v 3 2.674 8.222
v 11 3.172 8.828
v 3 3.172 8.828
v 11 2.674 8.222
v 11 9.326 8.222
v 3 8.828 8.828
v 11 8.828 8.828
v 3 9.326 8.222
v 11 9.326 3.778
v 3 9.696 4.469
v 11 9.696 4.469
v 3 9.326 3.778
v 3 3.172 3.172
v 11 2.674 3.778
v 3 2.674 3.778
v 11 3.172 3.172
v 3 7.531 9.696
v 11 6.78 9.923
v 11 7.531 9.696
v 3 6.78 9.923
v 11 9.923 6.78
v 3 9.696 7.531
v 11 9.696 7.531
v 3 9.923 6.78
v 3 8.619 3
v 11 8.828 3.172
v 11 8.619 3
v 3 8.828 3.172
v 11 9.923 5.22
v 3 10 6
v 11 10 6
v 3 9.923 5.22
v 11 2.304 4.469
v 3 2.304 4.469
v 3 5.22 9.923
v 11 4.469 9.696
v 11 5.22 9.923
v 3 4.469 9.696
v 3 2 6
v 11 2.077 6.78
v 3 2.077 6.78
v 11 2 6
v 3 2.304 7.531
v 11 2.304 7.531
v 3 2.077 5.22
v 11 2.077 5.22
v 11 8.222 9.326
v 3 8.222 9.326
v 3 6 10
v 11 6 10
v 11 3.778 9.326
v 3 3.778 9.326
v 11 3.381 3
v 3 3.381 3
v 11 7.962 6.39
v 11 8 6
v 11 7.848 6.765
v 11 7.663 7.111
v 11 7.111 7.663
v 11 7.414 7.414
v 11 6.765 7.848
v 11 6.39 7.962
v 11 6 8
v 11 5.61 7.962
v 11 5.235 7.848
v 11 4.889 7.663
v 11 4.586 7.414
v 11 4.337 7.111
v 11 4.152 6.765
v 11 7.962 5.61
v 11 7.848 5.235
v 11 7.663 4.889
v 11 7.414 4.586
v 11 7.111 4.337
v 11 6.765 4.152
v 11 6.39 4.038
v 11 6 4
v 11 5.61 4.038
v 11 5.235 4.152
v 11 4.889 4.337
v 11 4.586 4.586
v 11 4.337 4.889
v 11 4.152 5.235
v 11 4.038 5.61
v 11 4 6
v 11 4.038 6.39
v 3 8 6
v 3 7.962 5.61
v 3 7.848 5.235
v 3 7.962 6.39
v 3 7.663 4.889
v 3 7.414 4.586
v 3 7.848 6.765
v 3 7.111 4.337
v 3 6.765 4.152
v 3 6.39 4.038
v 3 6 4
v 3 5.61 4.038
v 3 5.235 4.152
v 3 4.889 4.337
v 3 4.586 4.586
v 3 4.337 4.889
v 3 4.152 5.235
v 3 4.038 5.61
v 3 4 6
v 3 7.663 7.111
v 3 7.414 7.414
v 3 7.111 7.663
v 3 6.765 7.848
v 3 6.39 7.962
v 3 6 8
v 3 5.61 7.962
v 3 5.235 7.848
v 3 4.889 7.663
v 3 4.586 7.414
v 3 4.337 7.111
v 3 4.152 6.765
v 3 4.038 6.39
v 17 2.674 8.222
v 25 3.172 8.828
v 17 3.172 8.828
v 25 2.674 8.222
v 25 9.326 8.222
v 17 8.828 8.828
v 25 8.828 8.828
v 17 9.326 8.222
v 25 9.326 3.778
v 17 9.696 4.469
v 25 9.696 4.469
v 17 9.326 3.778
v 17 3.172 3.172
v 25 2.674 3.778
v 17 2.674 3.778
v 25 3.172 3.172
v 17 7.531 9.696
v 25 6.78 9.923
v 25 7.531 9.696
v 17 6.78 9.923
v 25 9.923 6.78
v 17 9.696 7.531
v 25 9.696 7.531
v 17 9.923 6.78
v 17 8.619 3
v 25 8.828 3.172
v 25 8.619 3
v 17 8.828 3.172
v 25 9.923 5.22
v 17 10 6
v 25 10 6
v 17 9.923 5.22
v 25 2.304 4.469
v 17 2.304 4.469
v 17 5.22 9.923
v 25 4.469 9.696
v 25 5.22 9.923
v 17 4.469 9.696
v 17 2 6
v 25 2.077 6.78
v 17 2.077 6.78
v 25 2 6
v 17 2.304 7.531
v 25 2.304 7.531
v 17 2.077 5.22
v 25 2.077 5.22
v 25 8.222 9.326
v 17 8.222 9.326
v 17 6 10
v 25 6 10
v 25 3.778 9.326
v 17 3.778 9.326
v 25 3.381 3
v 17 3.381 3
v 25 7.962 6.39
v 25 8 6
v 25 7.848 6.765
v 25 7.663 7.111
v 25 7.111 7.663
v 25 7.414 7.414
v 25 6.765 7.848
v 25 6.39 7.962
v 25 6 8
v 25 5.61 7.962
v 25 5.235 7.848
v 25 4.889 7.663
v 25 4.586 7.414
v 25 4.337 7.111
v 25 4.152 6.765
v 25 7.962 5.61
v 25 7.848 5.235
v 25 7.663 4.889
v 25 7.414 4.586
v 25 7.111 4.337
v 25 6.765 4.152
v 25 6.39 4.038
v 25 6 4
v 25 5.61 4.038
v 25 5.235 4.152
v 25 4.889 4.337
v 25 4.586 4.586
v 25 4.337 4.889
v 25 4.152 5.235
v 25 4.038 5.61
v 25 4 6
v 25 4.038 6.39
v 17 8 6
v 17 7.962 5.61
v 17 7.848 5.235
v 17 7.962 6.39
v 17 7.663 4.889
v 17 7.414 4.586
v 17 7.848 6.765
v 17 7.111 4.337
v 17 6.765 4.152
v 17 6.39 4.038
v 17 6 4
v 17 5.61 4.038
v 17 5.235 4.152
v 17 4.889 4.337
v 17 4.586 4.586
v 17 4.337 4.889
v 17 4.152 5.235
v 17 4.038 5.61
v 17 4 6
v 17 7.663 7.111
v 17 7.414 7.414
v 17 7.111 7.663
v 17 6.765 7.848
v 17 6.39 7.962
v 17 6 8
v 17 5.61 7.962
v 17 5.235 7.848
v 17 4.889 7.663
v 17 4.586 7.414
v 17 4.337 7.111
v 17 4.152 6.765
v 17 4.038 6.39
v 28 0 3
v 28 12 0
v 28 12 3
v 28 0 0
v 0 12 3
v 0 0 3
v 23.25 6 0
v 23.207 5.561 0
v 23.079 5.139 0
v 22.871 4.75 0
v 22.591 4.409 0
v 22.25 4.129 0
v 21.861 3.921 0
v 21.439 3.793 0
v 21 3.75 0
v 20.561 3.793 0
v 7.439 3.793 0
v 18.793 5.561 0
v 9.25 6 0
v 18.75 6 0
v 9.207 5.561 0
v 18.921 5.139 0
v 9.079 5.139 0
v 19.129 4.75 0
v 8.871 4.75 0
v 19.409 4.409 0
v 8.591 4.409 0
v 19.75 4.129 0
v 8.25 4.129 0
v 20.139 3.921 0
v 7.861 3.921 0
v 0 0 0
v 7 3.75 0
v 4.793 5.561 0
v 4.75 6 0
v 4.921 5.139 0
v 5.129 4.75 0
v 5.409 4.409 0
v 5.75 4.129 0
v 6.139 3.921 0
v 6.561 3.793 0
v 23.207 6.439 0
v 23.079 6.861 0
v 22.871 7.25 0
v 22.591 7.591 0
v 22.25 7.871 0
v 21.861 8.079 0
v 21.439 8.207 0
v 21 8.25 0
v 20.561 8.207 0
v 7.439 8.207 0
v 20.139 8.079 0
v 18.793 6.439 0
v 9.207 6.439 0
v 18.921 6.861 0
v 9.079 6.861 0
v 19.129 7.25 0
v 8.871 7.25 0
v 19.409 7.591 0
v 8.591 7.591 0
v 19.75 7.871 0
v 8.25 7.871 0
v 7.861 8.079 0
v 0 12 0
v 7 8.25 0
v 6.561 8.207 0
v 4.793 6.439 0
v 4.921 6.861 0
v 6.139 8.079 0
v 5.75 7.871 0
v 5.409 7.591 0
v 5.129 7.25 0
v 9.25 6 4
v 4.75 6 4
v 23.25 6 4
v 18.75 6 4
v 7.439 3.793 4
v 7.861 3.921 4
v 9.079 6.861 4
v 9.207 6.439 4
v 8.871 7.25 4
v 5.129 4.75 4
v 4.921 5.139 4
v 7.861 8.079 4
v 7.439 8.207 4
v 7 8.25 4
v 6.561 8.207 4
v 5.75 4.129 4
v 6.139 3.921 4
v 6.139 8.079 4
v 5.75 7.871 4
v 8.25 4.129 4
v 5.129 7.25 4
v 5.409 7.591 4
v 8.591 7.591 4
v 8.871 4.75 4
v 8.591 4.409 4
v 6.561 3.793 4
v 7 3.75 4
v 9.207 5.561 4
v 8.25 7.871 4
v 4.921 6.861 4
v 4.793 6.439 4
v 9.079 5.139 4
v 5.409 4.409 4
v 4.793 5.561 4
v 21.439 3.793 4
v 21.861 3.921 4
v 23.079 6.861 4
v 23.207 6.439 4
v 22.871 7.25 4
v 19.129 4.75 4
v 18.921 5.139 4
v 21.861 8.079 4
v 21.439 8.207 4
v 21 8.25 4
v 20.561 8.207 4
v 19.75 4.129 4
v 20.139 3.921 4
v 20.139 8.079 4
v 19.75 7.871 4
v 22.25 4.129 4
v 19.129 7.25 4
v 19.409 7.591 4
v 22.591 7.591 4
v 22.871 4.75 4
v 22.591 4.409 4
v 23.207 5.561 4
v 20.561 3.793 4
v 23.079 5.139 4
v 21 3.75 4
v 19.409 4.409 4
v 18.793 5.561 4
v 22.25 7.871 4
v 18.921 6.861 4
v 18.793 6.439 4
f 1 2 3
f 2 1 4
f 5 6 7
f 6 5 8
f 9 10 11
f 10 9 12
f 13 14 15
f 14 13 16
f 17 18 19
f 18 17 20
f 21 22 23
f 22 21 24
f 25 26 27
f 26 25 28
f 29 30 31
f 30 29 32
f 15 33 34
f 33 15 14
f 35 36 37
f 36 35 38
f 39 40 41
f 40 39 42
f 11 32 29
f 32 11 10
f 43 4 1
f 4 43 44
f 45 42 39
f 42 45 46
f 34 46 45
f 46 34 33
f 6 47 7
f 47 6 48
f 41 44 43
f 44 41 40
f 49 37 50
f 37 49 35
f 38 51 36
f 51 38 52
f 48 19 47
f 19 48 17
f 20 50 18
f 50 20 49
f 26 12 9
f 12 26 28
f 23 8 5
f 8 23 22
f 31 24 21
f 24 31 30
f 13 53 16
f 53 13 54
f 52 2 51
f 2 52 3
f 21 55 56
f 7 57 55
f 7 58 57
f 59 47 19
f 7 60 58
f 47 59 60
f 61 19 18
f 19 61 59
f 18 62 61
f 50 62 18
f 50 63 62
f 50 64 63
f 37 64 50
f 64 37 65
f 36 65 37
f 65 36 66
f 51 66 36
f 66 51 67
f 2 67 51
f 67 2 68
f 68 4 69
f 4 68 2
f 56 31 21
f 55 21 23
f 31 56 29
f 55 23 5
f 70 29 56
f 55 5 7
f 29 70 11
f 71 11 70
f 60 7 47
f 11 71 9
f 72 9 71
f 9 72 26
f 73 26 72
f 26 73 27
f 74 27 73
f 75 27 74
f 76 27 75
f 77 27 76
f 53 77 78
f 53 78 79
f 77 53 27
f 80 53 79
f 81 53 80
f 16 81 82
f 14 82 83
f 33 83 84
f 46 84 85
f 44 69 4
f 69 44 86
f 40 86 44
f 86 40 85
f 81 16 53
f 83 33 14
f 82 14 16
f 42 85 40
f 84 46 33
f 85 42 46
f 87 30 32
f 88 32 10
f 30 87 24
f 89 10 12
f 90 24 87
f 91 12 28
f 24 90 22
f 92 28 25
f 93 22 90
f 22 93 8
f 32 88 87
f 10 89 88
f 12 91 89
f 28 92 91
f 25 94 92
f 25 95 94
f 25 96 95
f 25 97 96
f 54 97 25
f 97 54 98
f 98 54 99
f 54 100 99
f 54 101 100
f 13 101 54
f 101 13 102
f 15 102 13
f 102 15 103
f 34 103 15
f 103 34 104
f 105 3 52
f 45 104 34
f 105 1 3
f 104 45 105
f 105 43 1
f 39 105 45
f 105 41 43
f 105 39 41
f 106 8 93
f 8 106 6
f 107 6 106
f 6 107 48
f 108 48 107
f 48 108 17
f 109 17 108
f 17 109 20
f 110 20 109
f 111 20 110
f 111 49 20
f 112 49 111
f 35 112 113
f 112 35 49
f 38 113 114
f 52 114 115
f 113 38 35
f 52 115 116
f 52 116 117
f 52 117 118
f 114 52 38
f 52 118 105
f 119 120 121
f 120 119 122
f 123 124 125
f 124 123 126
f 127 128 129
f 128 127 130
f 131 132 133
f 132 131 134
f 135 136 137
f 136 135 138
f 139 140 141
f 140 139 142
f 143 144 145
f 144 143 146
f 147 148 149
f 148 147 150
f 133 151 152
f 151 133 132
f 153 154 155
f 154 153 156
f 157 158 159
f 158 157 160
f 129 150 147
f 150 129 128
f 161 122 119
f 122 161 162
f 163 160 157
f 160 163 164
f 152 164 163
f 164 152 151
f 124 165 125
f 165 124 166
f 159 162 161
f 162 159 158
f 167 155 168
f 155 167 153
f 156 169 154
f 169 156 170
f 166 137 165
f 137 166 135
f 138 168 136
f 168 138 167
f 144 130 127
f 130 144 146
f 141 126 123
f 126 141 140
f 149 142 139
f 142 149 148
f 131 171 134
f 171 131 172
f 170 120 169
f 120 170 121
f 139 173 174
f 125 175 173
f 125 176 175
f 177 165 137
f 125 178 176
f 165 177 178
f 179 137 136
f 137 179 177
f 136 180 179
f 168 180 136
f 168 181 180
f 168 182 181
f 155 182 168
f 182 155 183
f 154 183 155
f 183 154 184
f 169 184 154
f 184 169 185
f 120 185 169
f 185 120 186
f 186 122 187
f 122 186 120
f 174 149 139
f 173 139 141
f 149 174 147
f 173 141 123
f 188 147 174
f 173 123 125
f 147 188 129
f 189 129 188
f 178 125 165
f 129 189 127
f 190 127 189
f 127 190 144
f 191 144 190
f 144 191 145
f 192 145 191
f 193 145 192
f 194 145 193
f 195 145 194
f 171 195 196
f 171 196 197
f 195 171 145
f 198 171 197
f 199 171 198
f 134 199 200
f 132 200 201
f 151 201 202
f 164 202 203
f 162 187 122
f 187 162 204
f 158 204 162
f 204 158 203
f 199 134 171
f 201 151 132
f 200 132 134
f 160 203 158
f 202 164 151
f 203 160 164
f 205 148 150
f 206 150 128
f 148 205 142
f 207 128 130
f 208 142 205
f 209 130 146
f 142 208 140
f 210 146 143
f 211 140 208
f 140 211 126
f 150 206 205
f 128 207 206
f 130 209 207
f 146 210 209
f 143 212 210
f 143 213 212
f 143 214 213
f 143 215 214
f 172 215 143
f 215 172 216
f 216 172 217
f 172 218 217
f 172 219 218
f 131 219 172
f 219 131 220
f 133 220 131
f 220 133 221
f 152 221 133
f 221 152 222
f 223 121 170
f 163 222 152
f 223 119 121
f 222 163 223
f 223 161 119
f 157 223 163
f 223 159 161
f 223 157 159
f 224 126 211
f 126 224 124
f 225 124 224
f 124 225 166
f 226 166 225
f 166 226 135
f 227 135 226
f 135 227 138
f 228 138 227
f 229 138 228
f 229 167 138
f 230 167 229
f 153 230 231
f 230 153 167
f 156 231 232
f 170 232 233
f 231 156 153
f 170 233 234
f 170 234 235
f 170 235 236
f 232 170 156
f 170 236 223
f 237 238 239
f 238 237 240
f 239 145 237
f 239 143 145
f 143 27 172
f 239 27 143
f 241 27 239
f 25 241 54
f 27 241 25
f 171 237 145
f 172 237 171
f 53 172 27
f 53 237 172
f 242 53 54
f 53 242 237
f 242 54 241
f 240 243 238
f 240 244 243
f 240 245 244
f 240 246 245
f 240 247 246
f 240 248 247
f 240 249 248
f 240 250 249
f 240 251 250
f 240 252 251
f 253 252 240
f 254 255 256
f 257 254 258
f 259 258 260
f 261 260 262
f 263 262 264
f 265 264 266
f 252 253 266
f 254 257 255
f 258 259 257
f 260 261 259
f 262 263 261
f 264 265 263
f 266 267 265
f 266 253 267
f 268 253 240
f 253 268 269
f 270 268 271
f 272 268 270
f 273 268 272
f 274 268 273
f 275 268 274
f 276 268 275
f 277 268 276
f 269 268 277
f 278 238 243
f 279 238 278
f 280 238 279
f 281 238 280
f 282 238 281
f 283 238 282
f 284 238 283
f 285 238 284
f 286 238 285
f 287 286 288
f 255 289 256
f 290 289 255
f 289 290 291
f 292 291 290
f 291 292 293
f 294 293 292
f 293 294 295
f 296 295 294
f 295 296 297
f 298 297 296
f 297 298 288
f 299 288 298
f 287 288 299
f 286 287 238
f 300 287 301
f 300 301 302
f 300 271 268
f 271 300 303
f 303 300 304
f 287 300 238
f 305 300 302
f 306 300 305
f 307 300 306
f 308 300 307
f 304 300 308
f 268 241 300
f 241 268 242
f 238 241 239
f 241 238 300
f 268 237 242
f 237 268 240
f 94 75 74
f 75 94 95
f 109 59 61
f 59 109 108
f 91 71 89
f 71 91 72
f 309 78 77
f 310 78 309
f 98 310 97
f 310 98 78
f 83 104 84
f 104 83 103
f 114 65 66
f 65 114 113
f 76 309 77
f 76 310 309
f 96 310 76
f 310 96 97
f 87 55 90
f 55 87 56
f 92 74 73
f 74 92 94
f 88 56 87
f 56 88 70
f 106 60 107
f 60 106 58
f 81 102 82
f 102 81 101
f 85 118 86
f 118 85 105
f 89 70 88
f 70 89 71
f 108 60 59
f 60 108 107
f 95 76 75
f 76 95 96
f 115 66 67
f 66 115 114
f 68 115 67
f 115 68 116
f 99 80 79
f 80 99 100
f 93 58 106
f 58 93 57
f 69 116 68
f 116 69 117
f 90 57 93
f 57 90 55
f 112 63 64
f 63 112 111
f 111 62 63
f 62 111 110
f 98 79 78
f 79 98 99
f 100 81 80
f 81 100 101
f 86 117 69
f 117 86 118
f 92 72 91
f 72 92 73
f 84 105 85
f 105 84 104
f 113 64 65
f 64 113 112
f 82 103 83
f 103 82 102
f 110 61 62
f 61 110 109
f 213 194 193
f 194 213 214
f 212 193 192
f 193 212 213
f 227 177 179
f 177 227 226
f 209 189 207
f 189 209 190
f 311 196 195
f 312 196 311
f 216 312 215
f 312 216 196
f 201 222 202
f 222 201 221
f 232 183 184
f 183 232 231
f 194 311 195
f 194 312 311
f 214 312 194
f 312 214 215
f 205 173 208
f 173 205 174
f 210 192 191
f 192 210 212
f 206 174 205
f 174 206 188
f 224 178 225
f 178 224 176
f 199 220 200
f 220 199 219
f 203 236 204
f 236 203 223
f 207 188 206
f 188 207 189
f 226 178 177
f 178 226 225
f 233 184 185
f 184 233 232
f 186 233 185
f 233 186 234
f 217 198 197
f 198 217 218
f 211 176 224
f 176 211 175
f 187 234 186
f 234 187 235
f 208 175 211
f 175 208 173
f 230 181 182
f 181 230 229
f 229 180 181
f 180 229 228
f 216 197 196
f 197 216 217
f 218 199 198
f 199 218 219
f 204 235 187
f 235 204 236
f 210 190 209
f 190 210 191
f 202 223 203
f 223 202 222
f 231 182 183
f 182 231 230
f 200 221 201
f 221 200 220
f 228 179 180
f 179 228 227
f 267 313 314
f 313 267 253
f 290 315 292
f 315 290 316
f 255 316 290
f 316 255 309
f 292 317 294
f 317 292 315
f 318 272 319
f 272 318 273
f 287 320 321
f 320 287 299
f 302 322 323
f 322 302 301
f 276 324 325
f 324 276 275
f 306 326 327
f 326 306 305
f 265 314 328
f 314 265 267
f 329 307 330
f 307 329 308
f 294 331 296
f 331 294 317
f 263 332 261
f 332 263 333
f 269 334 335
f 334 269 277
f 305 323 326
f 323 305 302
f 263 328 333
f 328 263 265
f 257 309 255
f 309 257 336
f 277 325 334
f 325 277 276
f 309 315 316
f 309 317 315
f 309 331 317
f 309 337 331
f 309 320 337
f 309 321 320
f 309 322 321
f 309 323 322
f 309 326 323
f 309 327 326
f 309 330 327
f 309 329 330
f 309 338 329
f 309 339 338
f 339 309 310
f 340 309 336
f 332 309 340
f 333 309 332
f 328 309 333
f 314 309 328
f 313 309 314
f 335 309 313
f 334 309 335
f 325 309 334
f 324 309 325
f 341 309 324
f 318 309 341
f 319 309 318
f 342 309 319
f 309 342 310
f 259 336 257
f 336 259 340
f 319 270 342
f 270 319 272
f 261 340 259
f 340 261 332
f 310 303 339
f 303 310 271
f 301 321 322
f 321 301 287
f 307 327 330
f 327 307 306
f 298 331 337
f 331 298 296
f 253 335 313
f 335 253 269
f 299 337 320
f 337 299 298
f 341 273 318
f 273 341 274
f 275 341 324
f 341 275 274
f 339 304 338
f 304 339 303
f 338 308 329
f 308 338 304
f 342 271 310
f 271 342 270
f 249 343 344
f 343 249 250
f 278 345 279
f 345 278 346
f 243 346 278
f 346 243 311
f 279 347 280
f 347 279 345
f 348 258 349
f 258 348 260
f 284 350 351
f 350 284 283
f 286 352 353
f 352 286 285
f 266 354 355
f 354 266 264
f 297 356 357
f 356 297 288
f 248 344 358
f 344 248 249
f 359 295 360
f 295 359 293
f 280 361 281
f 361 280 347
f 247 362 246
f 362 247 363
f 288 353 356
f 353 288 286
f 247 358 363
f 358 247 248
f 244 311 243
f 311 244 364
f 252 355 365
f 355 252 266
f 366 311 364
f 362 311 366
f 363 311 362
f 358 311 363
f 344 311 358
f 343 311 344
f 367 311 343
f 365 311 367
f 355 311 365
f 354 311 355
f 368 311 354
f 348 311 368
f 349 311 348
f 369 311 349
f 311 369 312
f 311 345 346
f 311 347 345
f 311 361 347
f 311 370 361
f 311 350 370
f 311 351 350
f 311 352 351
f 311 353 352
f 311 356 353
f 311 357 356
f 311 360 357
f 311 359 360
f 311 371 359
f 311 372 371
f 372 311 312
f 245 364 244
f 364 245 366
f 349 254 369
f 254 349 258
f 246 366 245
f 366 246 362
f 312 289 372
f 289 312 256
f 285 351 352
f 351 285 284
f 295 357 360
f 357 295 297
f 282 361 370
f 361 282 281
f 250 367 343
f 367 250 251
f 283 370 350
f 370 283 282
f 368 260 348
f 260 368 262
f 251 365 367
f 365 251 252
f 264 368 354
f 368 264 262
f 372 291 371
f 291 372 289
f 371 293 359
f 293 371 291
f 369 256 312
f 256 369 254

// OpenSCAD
$fn = 32;

// ----------------------------------------------------------------------
// Cable clip: cable 4 mm, clamp 8 mm, base 28 mm
// ----------------------------------------------------------------------

// --- parameters (mm) ---
foot_w = 28;              // base length, X
foot_d = 12;              // base width, Y
foot_t = 3;               // base thickness
hose_seat_d = 8;          // clamp outside diameter
ring_t = 2;               // clamp wall
cable_d = 4;              // cable opening
ring_w = 8;               // clamp width along the cable
screw_d = 4.5;            // screw clearance
sink = 1;                 // overlap of the clamp into the base
pitch = 14;               // distance between the two clamps

module base() {
  cube([foot_w, foot_d, foot_t]);
}

module clamps() {
  for (sx = [-1, 1])
    translate([foot_w / 2 + sx * pitch / 2, foot_d / 2, foot_t + hose_seat_d / 2 - sink]) rotate([0, 90, 0])
      cylinder(h = ring_w, d = hose_seat_d, center = true);
}

difference() {
  union() {
    base();
    clamps();
  }
  for (sx = [-1, 1])
    translate([foot_w / 2 + sx * pitch / 2, foot_d / 2, foot_t + hose_seat_d / 2 - sink]) rotate([0, 90, 0]) translate([0, 0, -ring_w / 2 - 1]) cylinder(h = ring_w + 2, d = cable_d);
  translate([7, foot_d / 2, -1]) cylinder(h = foot_t + 2, d = screw_d);
  translate([21, foot_d / 2, -1]) cylinder(h = foot_t + 2, d = screw_d);
}
